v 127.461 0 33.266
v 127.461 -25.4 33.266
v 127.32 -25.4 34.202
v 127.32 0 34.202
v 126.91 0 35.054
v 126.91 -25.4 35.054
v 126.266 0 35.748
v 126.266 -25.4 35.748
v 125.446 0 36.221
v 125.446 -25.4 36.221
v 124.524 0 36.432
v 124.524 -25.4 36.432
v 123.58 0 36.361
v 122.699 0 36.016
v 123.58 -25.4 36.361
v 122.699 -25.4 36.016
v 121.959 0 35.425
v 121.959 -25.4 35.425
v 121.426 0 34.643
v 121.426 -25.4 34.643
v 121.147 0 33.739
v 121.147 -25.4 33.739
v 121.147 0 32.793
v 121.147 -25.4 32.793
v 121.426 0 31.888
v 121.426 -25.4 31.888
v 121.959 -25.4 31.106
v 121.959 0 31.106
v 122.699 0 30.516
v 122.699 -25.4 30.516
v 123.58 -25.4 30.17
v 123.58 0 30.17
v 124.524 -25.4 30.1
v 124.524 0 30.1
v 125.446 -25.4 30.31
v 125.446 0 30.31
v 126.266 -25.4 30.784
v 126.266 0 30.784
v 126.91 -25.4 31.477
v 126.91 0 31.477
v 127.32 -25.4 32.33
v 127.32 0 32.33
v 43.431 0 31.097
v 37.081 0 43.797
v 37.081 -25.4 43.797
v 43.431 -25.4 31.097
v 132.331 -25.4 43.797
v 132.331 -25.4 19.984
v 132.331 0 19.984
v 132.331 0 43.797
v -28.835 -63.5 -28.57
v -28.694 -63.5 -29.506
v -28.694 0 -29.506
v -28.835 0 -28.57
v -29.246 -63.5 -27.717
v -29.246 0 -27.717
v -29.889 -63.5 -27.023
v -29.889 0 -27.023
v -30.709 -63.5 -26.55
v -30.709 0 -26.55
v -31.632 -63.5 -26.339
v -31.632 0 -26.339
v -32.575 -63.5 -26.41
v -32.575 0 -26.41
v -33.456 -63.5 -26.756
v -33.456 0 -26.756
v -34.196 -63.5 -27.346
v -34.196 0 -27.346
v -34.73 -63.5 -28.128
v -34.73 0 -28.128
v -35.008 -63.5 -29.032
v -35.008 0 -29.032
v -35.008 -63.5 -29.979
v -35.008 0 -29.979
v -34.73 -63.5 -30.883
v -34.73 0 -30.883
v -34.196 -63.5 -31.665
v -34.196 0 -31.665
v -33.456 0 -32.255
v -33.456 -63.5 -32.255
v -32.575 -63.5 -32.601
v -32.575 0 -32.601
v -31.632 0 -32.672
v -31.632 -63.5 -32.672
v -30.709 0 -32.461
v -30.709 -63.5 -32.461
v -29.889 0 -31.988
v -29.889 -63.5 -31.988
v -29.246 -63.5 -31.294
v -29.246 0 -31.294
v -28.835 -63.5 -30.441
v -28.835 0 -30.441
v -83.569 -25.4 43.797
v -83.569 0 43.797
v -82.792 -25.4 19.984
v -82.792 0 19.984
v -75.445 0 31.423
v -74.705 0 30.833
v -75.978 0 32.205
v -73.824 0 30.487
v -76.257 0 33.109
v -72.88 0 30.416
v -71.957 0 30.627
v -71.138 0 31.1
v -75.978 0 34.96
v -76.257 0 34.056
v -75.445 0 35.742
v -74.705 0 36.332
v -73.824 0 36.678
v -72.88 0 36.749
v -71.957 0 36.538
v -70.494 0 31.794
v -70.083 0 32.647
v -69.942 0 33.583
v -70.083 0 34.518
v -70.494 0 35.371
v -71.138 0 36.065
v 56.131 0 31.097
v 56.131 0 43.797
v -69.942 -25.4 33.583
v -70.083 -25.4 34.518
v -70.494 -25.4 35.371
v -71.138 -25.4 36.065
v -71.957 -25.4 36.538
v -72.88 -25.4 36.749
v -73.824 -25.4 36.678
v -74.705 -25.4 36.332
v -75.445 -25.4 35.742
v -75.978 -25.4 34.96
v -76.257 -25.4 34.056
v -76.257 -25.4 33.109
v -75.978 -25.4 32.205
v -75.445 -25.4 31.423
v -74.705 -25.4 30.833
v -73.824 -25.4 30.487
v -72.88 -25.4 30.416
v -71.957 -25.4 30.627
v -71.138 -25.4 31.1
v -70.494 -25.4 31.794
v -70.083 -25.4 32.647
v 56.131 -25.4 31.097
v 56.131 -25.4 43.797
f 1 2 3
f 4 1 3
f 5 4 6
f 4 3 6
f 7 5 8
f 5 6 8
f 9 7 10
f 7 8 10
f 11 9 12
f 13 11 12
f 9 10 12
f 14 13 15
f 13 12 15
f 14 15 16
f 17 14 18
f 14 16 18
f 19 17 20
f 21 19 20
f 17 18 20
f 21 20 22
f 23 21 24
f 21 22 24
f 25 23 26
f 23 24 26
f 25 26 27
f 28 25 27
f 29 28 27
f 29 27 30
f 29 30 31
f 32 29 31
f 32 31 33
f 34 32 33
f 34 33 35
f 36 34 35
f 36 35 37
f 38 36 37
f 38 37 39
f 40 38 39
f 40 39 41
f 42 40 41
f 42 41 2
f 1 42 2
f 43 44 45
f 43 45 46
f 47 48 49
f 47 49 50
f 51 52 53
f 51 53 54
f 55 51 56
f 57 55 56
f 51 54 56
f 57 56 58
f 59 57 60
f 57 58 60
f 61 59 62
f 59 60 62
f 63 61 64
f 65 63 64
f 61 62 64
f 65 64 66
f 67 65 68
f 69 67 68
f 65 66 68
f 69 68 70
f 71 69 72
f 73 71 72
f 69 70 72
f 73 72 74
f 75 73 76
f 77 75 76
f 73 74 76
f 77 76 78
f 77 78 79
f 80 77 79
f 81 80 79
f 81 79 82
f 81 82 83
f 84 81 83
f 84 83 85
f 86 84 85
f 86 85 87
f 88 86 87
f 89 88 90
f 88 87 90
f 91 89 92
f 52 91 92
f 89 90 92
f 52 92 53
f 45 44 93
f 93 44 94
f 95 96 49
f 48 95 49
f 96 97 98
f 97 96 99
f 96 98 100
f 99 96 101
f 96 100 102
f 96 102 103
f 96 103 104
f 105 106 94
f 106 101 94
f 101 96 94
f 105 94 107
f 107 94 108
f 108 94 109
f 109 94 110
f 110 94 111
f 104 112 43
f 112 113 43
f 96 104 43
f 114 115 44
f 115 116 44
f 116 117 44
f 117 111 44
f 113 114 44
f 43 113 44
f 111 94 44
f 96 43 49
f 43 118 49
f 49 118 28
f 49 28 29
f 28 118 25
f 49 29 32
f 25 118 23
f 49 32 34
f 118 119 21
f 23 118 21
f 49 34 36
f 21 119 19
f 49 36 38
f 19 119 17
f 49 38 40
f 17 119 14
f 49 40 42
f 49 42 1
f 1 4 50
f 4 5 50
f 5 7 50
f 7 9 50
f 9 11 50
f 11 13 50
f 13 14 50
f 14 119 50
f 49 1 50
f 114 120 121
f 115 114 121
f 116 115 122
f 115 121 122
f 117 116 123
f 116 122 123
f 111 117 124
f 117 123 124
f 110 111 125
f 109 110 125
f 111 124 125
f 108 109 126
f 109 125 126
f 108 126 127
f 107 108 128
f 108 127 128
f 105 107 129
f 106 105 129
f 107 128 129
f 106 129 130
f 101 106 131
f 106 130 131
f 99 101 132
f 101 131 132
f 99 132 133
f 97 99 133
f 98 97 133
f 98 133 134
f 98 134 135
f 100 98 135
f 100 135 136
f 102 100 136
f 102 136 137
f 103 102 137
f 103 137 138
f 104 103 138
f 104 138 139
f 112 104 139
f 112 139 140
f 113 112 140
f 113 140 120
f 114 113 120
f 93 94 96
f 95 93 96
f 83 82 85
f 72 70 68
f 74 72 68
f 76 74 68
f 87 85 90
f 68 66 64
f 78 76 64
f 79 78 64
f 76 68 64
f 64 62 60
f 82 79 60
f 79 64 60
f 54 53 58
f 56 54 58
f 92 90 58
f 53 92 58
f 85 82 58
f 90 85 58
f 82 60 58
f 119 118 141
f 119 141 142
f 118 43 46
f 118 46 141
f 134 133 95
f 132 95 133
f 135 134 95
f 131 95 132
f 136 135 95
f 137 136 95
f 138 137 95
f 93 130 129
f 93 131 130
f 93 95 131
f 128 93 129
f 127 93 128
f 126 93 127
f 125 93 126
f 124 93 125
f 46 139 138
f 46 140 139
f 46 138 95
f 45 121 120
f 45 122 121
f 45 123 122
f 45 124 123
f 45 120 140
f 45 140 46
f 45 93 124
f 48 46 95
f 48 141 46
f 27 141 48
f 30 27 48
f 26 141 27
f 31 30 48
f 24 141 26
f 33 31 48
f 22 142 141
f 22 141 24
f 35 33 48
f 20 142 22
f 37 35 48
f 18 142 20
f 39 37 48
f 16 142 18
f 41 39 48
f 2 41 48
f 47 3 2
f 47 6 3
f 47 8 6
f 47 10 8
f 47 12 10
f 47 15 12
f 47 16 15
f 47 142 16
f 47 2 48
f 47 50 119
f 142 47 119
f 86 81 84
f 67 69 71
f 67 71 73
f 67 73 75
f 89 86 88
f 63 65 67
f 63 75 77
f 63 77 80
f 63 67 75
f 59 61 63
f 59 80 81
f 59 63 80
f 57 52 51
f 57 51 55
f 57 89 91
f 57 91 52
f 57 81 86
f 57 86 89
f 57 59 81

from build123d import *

# Parameters (mm, degrees)
F1_DEPTH = 25.4
F2_R     = 3.175
F3_DEPTH = 25.401
F4_R     = 3.175
F5_DEPTH = 63.5


# Not quite as in the source:
# - a feature names something its author has since deleted; it is built from what else it names


with BuildPart() as f1:
    # F0 (on Front) → F1 (new body)
    with BuildSketch(Plane.XZ):
        Polygon((132.3305627346, 43.7965765595), (-83.5694372654, 43.7965765595), (-82.7916205839, 19.9840765595), (132.3305627346, 19.9840765595), align=None)
    extrude(amount=F1_DEPTH)

    # F2 (on face) → F3 (cut, through all)
    with BuildSketch(Plane.XZ.offset(25.4)):
        with Locations((-73.1171146035, 33.582534641)):
            Circle(F2_R)
        Polygon((43.4305627346, 31.0965765595), (56.1305627346, 31.0965765595), (56.1305627346, 43.7965765595), (37.0805627346, 43.7965765595), align=None)
        with Locations((124.286480248, 33.2658700645)):
            Circle(F2_R)
    extrude(amount=-F3_DEPTH, mode=Mode.SUBTRACT)


with BuildPart() as f5:
    # F4 (on Front) → F5 (new body)
    with BuildSketch(Plane.XZ):
        with Locations((-31.8689309061, -29.5055080205)):
            Circle(F4_R)
    extrude(amount=F5_DEPTH)


solid = Compound([f1.part, f5.part])
